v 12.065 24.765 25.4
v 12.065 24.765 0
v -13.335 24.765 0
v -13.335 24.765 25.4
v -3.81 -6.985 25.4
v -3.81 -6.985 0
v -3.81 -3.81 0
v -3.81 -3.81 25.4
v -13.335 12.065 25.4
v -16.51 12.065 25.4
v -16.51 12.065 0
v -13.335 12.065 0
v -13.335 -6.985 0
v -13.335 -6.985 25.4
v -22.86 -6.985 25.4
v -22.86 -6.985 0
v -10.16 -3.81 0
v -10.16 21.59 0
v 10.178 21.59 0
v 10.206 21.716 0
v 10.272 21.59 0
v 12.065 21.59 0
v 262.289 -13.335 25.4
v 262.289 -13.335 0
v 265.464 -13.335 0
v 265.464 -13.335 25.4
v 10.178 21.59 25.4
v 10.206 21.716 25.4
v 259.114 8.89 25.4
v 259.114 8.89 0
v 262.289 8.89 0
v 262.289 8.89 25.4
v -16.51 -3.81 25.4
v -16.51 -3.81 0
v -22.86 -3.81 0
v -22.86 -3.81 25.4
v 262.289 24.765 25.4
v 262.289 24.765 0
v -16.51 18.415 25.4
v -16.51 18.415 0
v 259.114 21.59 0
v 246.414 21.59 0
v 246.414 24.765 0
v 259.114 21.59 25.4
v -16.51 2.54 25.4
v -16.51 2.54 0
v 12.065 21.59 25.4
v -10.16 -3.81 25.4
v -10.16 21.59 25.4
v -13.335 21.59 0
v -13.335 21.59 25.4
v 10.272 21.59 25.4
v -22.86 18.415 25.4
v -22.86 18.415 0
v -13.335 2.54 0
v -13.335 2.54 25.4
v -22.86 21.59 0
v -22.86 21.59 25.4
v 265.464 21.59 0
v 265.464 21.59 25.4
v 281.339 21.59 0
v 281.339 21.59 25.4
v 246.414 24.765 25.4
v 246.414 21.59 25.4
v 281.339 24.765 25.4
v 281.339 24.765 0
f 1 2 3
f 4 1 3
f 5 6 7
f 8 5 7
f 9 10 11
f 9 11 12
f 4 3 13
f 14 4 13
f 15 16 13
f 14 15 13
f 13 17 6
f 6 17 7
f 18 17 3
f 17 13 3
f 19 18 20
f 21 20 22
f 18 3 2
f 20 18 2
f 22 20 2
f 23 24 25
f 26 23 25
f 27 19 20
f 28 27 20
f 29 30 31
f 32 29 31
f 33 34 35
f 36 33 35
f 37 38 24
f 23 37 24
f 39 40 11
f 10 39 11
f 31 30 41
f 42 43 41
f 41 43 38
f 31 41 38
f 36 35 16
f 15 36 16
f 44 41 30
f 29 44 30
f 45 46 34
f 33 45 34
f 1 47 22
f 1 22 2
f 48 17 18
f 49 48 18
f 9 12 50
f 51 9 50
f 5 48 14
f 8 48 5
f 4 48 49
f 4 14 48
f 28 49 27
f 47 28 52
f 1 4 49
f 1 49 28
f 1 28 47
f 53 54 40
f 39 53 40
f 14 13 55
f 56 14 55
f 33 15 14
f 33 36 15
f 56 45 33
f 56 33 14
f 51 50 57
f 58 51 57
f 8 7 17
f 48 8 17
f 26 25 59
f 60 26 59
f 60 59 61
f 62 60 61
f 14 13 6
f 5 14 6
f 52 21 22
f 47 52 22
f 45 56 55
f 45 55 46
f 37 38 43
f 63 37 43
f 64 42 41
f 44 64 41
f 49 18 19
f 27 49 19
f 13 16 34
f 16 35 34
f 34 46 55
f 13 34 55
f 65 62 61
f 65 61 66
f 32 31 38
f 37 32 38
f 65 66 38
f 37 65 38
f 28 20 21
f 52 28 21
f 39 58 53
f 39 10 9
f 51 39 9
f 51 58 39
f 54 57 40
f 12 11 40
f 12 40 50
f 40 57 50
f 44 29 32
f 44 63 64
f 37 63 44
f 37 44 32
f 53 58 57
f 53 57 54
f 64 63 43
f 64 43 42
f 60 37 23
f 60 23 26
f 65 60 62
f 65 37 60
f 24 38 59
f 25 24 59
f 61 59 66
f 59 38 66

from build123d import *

# Parameters (mm, degrees)
F1_DEPTH = 25.4
F2_DEPTH = 25.4
F3_DEPTH = 25.4
F4_DEPTH = 25.4


with BuildPart() as f1:
    # F0 (on Top) → F1 (new body)
    with BuildSketch(Plane.XY):
        Polygon((-10.16, 21.59), (2.54, 21.59), (10.178426, 21.59), (10.206263, 21.715837), (10.272177, 21.59), (12.065, 21.59), (12.065, 24.765), (-13.335, 24.765), (-13.335, 21.59), (-13.335, 18.415), (-13.335, 12.065), (-13.335, 2.54), (-13.335, -3.81), (-13.335, -6.985), (-3.81, -6.985), (-3.81, -3.81), (-10.16, -3.81), align=None)
    extrude(amount=F1_DEPTH)


with BuildPart() as f2:
    # F0 (on Top) → F2 (new body)
    with BuildSketch(Plane.XY):
        Polygon((-13.335, 18.415), (-13.335, 21.59), (-22.86, 21.59), (-22.86, 18.415), (-16.51, 18.415), (-16.51, 12.065), (-13.335, 12.065), align=None)
        Polygon((-22.86, -6.985), (-13.335, -6.985), (-13.335, -3.81), (-13.335, 2.54), (-16.51, 2.54), (-16.51, -3.81), (-22.86, -3.81), align=None)
    extrude(amount=F2_DEPTH)


with BuildPart() as f3:
    # F0 (on Top) → F3 (new body)
    with BuildSketch(Plane.XY):
        Polygon((281.338991, 24.765), (262.288991, 24.765), (262.288991, 21.59), (262.288991, 8.89), (262.288991, -13.335), (265.463991, -13.335), (265.463991, 21.59), (281.338991, 21.59), align=None)
    extrude(amount=F3_DEPTH)


with BuildPart() as f4:
    # F0 (on Top) → F4 (new body)
    with BuildSketch(Plane.XY):
        Polygon((246.413991, 21.59), (252.398074, 21.59), (259.113991, 21.59), (259.113991, 8.89), (262.288991, 8.89), (262.288991, 21.59), (262.288991, 24.765), (246.413991, 24.765), align=None)
    extrude(amount=F4_DEPTH)


solid = Compound([f1.part, f2.part, f3.part, f4.part])
